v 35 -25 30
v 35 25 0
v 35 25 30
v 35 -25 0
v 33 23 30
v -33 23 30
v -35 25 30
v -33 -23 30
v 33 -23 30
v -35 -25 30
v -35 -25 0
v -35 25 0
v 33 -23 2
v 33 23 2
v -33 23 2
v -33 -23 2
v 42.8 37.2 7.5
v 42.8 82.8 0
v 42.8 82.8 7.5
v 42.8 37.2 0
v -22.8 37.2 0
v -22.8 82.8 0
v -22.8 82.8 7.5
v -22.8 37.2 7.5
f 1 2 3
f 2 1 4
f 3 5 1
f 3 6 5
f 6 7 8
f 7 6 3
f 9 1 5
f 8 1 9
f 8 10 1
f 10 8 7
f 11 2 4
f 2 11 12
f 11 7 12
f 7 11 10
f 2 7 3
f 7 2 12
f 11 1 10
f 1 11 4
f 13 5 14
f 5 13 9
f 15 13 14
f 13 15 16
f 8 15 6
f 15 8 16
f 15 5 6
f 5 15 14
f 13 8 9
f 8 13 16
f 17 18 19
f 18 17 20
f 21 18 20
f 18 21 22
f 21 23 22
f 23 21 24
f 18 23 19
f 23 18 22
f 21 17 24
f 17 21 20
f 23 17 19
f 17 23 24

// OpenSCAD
// Two-part enclosure for small electronics board
// Print orientation: box standing on bed, lid upside down (plate on bed)

$fn = 64;

// ---- Box ----
box_x = 70;      // outer length (X)
box_y = 50;      // outer width (Y)
box_z = 30;      // outer height (Z)
wall = 2;        // wall thickness
floor = 2;       // floor thickness

// ---- Lid ----
lip_w = 65.6;    // lip outer length (X)
lip_d = 45.6;    // lip outer width (Y)
lip_h = 4;       // lip height (wall thickness)
lip_t = 1.5;     // lip top thickness

// ---- Misc ----
eps = 0.5;       // cutter overshoot
gap = 10;        // gap between parts on bed

// Derived
inner_x = box_x - 2*wall;
inner_y = box_y - 2*wall;
lip_total_h = lip_h + lip_t;   // lip top at z = floor + lip_total_h

module box() {
    difference() {
        translate([-box_x/2, -box_y/2, 0])
            cube([box_x, box_y, box_z]);
        translate([-inner_x/2, -inner_y/2, floor])
            cube([inner_x, inner_y, box_z - floor + eps]); // open top
    }
}

module lid() {
    translate([gap - lip_w/2, -lip_d/2, 0])
        union() {
            // Plate
            cube([lip_w, lip_d, 2]);
            // Lip
            translate([0, 0, 2])
                cube([lip_w, lip_d, lip_total_h]);
        }
}

box();
translate([0, box_y + gap, 0])
    lid();
